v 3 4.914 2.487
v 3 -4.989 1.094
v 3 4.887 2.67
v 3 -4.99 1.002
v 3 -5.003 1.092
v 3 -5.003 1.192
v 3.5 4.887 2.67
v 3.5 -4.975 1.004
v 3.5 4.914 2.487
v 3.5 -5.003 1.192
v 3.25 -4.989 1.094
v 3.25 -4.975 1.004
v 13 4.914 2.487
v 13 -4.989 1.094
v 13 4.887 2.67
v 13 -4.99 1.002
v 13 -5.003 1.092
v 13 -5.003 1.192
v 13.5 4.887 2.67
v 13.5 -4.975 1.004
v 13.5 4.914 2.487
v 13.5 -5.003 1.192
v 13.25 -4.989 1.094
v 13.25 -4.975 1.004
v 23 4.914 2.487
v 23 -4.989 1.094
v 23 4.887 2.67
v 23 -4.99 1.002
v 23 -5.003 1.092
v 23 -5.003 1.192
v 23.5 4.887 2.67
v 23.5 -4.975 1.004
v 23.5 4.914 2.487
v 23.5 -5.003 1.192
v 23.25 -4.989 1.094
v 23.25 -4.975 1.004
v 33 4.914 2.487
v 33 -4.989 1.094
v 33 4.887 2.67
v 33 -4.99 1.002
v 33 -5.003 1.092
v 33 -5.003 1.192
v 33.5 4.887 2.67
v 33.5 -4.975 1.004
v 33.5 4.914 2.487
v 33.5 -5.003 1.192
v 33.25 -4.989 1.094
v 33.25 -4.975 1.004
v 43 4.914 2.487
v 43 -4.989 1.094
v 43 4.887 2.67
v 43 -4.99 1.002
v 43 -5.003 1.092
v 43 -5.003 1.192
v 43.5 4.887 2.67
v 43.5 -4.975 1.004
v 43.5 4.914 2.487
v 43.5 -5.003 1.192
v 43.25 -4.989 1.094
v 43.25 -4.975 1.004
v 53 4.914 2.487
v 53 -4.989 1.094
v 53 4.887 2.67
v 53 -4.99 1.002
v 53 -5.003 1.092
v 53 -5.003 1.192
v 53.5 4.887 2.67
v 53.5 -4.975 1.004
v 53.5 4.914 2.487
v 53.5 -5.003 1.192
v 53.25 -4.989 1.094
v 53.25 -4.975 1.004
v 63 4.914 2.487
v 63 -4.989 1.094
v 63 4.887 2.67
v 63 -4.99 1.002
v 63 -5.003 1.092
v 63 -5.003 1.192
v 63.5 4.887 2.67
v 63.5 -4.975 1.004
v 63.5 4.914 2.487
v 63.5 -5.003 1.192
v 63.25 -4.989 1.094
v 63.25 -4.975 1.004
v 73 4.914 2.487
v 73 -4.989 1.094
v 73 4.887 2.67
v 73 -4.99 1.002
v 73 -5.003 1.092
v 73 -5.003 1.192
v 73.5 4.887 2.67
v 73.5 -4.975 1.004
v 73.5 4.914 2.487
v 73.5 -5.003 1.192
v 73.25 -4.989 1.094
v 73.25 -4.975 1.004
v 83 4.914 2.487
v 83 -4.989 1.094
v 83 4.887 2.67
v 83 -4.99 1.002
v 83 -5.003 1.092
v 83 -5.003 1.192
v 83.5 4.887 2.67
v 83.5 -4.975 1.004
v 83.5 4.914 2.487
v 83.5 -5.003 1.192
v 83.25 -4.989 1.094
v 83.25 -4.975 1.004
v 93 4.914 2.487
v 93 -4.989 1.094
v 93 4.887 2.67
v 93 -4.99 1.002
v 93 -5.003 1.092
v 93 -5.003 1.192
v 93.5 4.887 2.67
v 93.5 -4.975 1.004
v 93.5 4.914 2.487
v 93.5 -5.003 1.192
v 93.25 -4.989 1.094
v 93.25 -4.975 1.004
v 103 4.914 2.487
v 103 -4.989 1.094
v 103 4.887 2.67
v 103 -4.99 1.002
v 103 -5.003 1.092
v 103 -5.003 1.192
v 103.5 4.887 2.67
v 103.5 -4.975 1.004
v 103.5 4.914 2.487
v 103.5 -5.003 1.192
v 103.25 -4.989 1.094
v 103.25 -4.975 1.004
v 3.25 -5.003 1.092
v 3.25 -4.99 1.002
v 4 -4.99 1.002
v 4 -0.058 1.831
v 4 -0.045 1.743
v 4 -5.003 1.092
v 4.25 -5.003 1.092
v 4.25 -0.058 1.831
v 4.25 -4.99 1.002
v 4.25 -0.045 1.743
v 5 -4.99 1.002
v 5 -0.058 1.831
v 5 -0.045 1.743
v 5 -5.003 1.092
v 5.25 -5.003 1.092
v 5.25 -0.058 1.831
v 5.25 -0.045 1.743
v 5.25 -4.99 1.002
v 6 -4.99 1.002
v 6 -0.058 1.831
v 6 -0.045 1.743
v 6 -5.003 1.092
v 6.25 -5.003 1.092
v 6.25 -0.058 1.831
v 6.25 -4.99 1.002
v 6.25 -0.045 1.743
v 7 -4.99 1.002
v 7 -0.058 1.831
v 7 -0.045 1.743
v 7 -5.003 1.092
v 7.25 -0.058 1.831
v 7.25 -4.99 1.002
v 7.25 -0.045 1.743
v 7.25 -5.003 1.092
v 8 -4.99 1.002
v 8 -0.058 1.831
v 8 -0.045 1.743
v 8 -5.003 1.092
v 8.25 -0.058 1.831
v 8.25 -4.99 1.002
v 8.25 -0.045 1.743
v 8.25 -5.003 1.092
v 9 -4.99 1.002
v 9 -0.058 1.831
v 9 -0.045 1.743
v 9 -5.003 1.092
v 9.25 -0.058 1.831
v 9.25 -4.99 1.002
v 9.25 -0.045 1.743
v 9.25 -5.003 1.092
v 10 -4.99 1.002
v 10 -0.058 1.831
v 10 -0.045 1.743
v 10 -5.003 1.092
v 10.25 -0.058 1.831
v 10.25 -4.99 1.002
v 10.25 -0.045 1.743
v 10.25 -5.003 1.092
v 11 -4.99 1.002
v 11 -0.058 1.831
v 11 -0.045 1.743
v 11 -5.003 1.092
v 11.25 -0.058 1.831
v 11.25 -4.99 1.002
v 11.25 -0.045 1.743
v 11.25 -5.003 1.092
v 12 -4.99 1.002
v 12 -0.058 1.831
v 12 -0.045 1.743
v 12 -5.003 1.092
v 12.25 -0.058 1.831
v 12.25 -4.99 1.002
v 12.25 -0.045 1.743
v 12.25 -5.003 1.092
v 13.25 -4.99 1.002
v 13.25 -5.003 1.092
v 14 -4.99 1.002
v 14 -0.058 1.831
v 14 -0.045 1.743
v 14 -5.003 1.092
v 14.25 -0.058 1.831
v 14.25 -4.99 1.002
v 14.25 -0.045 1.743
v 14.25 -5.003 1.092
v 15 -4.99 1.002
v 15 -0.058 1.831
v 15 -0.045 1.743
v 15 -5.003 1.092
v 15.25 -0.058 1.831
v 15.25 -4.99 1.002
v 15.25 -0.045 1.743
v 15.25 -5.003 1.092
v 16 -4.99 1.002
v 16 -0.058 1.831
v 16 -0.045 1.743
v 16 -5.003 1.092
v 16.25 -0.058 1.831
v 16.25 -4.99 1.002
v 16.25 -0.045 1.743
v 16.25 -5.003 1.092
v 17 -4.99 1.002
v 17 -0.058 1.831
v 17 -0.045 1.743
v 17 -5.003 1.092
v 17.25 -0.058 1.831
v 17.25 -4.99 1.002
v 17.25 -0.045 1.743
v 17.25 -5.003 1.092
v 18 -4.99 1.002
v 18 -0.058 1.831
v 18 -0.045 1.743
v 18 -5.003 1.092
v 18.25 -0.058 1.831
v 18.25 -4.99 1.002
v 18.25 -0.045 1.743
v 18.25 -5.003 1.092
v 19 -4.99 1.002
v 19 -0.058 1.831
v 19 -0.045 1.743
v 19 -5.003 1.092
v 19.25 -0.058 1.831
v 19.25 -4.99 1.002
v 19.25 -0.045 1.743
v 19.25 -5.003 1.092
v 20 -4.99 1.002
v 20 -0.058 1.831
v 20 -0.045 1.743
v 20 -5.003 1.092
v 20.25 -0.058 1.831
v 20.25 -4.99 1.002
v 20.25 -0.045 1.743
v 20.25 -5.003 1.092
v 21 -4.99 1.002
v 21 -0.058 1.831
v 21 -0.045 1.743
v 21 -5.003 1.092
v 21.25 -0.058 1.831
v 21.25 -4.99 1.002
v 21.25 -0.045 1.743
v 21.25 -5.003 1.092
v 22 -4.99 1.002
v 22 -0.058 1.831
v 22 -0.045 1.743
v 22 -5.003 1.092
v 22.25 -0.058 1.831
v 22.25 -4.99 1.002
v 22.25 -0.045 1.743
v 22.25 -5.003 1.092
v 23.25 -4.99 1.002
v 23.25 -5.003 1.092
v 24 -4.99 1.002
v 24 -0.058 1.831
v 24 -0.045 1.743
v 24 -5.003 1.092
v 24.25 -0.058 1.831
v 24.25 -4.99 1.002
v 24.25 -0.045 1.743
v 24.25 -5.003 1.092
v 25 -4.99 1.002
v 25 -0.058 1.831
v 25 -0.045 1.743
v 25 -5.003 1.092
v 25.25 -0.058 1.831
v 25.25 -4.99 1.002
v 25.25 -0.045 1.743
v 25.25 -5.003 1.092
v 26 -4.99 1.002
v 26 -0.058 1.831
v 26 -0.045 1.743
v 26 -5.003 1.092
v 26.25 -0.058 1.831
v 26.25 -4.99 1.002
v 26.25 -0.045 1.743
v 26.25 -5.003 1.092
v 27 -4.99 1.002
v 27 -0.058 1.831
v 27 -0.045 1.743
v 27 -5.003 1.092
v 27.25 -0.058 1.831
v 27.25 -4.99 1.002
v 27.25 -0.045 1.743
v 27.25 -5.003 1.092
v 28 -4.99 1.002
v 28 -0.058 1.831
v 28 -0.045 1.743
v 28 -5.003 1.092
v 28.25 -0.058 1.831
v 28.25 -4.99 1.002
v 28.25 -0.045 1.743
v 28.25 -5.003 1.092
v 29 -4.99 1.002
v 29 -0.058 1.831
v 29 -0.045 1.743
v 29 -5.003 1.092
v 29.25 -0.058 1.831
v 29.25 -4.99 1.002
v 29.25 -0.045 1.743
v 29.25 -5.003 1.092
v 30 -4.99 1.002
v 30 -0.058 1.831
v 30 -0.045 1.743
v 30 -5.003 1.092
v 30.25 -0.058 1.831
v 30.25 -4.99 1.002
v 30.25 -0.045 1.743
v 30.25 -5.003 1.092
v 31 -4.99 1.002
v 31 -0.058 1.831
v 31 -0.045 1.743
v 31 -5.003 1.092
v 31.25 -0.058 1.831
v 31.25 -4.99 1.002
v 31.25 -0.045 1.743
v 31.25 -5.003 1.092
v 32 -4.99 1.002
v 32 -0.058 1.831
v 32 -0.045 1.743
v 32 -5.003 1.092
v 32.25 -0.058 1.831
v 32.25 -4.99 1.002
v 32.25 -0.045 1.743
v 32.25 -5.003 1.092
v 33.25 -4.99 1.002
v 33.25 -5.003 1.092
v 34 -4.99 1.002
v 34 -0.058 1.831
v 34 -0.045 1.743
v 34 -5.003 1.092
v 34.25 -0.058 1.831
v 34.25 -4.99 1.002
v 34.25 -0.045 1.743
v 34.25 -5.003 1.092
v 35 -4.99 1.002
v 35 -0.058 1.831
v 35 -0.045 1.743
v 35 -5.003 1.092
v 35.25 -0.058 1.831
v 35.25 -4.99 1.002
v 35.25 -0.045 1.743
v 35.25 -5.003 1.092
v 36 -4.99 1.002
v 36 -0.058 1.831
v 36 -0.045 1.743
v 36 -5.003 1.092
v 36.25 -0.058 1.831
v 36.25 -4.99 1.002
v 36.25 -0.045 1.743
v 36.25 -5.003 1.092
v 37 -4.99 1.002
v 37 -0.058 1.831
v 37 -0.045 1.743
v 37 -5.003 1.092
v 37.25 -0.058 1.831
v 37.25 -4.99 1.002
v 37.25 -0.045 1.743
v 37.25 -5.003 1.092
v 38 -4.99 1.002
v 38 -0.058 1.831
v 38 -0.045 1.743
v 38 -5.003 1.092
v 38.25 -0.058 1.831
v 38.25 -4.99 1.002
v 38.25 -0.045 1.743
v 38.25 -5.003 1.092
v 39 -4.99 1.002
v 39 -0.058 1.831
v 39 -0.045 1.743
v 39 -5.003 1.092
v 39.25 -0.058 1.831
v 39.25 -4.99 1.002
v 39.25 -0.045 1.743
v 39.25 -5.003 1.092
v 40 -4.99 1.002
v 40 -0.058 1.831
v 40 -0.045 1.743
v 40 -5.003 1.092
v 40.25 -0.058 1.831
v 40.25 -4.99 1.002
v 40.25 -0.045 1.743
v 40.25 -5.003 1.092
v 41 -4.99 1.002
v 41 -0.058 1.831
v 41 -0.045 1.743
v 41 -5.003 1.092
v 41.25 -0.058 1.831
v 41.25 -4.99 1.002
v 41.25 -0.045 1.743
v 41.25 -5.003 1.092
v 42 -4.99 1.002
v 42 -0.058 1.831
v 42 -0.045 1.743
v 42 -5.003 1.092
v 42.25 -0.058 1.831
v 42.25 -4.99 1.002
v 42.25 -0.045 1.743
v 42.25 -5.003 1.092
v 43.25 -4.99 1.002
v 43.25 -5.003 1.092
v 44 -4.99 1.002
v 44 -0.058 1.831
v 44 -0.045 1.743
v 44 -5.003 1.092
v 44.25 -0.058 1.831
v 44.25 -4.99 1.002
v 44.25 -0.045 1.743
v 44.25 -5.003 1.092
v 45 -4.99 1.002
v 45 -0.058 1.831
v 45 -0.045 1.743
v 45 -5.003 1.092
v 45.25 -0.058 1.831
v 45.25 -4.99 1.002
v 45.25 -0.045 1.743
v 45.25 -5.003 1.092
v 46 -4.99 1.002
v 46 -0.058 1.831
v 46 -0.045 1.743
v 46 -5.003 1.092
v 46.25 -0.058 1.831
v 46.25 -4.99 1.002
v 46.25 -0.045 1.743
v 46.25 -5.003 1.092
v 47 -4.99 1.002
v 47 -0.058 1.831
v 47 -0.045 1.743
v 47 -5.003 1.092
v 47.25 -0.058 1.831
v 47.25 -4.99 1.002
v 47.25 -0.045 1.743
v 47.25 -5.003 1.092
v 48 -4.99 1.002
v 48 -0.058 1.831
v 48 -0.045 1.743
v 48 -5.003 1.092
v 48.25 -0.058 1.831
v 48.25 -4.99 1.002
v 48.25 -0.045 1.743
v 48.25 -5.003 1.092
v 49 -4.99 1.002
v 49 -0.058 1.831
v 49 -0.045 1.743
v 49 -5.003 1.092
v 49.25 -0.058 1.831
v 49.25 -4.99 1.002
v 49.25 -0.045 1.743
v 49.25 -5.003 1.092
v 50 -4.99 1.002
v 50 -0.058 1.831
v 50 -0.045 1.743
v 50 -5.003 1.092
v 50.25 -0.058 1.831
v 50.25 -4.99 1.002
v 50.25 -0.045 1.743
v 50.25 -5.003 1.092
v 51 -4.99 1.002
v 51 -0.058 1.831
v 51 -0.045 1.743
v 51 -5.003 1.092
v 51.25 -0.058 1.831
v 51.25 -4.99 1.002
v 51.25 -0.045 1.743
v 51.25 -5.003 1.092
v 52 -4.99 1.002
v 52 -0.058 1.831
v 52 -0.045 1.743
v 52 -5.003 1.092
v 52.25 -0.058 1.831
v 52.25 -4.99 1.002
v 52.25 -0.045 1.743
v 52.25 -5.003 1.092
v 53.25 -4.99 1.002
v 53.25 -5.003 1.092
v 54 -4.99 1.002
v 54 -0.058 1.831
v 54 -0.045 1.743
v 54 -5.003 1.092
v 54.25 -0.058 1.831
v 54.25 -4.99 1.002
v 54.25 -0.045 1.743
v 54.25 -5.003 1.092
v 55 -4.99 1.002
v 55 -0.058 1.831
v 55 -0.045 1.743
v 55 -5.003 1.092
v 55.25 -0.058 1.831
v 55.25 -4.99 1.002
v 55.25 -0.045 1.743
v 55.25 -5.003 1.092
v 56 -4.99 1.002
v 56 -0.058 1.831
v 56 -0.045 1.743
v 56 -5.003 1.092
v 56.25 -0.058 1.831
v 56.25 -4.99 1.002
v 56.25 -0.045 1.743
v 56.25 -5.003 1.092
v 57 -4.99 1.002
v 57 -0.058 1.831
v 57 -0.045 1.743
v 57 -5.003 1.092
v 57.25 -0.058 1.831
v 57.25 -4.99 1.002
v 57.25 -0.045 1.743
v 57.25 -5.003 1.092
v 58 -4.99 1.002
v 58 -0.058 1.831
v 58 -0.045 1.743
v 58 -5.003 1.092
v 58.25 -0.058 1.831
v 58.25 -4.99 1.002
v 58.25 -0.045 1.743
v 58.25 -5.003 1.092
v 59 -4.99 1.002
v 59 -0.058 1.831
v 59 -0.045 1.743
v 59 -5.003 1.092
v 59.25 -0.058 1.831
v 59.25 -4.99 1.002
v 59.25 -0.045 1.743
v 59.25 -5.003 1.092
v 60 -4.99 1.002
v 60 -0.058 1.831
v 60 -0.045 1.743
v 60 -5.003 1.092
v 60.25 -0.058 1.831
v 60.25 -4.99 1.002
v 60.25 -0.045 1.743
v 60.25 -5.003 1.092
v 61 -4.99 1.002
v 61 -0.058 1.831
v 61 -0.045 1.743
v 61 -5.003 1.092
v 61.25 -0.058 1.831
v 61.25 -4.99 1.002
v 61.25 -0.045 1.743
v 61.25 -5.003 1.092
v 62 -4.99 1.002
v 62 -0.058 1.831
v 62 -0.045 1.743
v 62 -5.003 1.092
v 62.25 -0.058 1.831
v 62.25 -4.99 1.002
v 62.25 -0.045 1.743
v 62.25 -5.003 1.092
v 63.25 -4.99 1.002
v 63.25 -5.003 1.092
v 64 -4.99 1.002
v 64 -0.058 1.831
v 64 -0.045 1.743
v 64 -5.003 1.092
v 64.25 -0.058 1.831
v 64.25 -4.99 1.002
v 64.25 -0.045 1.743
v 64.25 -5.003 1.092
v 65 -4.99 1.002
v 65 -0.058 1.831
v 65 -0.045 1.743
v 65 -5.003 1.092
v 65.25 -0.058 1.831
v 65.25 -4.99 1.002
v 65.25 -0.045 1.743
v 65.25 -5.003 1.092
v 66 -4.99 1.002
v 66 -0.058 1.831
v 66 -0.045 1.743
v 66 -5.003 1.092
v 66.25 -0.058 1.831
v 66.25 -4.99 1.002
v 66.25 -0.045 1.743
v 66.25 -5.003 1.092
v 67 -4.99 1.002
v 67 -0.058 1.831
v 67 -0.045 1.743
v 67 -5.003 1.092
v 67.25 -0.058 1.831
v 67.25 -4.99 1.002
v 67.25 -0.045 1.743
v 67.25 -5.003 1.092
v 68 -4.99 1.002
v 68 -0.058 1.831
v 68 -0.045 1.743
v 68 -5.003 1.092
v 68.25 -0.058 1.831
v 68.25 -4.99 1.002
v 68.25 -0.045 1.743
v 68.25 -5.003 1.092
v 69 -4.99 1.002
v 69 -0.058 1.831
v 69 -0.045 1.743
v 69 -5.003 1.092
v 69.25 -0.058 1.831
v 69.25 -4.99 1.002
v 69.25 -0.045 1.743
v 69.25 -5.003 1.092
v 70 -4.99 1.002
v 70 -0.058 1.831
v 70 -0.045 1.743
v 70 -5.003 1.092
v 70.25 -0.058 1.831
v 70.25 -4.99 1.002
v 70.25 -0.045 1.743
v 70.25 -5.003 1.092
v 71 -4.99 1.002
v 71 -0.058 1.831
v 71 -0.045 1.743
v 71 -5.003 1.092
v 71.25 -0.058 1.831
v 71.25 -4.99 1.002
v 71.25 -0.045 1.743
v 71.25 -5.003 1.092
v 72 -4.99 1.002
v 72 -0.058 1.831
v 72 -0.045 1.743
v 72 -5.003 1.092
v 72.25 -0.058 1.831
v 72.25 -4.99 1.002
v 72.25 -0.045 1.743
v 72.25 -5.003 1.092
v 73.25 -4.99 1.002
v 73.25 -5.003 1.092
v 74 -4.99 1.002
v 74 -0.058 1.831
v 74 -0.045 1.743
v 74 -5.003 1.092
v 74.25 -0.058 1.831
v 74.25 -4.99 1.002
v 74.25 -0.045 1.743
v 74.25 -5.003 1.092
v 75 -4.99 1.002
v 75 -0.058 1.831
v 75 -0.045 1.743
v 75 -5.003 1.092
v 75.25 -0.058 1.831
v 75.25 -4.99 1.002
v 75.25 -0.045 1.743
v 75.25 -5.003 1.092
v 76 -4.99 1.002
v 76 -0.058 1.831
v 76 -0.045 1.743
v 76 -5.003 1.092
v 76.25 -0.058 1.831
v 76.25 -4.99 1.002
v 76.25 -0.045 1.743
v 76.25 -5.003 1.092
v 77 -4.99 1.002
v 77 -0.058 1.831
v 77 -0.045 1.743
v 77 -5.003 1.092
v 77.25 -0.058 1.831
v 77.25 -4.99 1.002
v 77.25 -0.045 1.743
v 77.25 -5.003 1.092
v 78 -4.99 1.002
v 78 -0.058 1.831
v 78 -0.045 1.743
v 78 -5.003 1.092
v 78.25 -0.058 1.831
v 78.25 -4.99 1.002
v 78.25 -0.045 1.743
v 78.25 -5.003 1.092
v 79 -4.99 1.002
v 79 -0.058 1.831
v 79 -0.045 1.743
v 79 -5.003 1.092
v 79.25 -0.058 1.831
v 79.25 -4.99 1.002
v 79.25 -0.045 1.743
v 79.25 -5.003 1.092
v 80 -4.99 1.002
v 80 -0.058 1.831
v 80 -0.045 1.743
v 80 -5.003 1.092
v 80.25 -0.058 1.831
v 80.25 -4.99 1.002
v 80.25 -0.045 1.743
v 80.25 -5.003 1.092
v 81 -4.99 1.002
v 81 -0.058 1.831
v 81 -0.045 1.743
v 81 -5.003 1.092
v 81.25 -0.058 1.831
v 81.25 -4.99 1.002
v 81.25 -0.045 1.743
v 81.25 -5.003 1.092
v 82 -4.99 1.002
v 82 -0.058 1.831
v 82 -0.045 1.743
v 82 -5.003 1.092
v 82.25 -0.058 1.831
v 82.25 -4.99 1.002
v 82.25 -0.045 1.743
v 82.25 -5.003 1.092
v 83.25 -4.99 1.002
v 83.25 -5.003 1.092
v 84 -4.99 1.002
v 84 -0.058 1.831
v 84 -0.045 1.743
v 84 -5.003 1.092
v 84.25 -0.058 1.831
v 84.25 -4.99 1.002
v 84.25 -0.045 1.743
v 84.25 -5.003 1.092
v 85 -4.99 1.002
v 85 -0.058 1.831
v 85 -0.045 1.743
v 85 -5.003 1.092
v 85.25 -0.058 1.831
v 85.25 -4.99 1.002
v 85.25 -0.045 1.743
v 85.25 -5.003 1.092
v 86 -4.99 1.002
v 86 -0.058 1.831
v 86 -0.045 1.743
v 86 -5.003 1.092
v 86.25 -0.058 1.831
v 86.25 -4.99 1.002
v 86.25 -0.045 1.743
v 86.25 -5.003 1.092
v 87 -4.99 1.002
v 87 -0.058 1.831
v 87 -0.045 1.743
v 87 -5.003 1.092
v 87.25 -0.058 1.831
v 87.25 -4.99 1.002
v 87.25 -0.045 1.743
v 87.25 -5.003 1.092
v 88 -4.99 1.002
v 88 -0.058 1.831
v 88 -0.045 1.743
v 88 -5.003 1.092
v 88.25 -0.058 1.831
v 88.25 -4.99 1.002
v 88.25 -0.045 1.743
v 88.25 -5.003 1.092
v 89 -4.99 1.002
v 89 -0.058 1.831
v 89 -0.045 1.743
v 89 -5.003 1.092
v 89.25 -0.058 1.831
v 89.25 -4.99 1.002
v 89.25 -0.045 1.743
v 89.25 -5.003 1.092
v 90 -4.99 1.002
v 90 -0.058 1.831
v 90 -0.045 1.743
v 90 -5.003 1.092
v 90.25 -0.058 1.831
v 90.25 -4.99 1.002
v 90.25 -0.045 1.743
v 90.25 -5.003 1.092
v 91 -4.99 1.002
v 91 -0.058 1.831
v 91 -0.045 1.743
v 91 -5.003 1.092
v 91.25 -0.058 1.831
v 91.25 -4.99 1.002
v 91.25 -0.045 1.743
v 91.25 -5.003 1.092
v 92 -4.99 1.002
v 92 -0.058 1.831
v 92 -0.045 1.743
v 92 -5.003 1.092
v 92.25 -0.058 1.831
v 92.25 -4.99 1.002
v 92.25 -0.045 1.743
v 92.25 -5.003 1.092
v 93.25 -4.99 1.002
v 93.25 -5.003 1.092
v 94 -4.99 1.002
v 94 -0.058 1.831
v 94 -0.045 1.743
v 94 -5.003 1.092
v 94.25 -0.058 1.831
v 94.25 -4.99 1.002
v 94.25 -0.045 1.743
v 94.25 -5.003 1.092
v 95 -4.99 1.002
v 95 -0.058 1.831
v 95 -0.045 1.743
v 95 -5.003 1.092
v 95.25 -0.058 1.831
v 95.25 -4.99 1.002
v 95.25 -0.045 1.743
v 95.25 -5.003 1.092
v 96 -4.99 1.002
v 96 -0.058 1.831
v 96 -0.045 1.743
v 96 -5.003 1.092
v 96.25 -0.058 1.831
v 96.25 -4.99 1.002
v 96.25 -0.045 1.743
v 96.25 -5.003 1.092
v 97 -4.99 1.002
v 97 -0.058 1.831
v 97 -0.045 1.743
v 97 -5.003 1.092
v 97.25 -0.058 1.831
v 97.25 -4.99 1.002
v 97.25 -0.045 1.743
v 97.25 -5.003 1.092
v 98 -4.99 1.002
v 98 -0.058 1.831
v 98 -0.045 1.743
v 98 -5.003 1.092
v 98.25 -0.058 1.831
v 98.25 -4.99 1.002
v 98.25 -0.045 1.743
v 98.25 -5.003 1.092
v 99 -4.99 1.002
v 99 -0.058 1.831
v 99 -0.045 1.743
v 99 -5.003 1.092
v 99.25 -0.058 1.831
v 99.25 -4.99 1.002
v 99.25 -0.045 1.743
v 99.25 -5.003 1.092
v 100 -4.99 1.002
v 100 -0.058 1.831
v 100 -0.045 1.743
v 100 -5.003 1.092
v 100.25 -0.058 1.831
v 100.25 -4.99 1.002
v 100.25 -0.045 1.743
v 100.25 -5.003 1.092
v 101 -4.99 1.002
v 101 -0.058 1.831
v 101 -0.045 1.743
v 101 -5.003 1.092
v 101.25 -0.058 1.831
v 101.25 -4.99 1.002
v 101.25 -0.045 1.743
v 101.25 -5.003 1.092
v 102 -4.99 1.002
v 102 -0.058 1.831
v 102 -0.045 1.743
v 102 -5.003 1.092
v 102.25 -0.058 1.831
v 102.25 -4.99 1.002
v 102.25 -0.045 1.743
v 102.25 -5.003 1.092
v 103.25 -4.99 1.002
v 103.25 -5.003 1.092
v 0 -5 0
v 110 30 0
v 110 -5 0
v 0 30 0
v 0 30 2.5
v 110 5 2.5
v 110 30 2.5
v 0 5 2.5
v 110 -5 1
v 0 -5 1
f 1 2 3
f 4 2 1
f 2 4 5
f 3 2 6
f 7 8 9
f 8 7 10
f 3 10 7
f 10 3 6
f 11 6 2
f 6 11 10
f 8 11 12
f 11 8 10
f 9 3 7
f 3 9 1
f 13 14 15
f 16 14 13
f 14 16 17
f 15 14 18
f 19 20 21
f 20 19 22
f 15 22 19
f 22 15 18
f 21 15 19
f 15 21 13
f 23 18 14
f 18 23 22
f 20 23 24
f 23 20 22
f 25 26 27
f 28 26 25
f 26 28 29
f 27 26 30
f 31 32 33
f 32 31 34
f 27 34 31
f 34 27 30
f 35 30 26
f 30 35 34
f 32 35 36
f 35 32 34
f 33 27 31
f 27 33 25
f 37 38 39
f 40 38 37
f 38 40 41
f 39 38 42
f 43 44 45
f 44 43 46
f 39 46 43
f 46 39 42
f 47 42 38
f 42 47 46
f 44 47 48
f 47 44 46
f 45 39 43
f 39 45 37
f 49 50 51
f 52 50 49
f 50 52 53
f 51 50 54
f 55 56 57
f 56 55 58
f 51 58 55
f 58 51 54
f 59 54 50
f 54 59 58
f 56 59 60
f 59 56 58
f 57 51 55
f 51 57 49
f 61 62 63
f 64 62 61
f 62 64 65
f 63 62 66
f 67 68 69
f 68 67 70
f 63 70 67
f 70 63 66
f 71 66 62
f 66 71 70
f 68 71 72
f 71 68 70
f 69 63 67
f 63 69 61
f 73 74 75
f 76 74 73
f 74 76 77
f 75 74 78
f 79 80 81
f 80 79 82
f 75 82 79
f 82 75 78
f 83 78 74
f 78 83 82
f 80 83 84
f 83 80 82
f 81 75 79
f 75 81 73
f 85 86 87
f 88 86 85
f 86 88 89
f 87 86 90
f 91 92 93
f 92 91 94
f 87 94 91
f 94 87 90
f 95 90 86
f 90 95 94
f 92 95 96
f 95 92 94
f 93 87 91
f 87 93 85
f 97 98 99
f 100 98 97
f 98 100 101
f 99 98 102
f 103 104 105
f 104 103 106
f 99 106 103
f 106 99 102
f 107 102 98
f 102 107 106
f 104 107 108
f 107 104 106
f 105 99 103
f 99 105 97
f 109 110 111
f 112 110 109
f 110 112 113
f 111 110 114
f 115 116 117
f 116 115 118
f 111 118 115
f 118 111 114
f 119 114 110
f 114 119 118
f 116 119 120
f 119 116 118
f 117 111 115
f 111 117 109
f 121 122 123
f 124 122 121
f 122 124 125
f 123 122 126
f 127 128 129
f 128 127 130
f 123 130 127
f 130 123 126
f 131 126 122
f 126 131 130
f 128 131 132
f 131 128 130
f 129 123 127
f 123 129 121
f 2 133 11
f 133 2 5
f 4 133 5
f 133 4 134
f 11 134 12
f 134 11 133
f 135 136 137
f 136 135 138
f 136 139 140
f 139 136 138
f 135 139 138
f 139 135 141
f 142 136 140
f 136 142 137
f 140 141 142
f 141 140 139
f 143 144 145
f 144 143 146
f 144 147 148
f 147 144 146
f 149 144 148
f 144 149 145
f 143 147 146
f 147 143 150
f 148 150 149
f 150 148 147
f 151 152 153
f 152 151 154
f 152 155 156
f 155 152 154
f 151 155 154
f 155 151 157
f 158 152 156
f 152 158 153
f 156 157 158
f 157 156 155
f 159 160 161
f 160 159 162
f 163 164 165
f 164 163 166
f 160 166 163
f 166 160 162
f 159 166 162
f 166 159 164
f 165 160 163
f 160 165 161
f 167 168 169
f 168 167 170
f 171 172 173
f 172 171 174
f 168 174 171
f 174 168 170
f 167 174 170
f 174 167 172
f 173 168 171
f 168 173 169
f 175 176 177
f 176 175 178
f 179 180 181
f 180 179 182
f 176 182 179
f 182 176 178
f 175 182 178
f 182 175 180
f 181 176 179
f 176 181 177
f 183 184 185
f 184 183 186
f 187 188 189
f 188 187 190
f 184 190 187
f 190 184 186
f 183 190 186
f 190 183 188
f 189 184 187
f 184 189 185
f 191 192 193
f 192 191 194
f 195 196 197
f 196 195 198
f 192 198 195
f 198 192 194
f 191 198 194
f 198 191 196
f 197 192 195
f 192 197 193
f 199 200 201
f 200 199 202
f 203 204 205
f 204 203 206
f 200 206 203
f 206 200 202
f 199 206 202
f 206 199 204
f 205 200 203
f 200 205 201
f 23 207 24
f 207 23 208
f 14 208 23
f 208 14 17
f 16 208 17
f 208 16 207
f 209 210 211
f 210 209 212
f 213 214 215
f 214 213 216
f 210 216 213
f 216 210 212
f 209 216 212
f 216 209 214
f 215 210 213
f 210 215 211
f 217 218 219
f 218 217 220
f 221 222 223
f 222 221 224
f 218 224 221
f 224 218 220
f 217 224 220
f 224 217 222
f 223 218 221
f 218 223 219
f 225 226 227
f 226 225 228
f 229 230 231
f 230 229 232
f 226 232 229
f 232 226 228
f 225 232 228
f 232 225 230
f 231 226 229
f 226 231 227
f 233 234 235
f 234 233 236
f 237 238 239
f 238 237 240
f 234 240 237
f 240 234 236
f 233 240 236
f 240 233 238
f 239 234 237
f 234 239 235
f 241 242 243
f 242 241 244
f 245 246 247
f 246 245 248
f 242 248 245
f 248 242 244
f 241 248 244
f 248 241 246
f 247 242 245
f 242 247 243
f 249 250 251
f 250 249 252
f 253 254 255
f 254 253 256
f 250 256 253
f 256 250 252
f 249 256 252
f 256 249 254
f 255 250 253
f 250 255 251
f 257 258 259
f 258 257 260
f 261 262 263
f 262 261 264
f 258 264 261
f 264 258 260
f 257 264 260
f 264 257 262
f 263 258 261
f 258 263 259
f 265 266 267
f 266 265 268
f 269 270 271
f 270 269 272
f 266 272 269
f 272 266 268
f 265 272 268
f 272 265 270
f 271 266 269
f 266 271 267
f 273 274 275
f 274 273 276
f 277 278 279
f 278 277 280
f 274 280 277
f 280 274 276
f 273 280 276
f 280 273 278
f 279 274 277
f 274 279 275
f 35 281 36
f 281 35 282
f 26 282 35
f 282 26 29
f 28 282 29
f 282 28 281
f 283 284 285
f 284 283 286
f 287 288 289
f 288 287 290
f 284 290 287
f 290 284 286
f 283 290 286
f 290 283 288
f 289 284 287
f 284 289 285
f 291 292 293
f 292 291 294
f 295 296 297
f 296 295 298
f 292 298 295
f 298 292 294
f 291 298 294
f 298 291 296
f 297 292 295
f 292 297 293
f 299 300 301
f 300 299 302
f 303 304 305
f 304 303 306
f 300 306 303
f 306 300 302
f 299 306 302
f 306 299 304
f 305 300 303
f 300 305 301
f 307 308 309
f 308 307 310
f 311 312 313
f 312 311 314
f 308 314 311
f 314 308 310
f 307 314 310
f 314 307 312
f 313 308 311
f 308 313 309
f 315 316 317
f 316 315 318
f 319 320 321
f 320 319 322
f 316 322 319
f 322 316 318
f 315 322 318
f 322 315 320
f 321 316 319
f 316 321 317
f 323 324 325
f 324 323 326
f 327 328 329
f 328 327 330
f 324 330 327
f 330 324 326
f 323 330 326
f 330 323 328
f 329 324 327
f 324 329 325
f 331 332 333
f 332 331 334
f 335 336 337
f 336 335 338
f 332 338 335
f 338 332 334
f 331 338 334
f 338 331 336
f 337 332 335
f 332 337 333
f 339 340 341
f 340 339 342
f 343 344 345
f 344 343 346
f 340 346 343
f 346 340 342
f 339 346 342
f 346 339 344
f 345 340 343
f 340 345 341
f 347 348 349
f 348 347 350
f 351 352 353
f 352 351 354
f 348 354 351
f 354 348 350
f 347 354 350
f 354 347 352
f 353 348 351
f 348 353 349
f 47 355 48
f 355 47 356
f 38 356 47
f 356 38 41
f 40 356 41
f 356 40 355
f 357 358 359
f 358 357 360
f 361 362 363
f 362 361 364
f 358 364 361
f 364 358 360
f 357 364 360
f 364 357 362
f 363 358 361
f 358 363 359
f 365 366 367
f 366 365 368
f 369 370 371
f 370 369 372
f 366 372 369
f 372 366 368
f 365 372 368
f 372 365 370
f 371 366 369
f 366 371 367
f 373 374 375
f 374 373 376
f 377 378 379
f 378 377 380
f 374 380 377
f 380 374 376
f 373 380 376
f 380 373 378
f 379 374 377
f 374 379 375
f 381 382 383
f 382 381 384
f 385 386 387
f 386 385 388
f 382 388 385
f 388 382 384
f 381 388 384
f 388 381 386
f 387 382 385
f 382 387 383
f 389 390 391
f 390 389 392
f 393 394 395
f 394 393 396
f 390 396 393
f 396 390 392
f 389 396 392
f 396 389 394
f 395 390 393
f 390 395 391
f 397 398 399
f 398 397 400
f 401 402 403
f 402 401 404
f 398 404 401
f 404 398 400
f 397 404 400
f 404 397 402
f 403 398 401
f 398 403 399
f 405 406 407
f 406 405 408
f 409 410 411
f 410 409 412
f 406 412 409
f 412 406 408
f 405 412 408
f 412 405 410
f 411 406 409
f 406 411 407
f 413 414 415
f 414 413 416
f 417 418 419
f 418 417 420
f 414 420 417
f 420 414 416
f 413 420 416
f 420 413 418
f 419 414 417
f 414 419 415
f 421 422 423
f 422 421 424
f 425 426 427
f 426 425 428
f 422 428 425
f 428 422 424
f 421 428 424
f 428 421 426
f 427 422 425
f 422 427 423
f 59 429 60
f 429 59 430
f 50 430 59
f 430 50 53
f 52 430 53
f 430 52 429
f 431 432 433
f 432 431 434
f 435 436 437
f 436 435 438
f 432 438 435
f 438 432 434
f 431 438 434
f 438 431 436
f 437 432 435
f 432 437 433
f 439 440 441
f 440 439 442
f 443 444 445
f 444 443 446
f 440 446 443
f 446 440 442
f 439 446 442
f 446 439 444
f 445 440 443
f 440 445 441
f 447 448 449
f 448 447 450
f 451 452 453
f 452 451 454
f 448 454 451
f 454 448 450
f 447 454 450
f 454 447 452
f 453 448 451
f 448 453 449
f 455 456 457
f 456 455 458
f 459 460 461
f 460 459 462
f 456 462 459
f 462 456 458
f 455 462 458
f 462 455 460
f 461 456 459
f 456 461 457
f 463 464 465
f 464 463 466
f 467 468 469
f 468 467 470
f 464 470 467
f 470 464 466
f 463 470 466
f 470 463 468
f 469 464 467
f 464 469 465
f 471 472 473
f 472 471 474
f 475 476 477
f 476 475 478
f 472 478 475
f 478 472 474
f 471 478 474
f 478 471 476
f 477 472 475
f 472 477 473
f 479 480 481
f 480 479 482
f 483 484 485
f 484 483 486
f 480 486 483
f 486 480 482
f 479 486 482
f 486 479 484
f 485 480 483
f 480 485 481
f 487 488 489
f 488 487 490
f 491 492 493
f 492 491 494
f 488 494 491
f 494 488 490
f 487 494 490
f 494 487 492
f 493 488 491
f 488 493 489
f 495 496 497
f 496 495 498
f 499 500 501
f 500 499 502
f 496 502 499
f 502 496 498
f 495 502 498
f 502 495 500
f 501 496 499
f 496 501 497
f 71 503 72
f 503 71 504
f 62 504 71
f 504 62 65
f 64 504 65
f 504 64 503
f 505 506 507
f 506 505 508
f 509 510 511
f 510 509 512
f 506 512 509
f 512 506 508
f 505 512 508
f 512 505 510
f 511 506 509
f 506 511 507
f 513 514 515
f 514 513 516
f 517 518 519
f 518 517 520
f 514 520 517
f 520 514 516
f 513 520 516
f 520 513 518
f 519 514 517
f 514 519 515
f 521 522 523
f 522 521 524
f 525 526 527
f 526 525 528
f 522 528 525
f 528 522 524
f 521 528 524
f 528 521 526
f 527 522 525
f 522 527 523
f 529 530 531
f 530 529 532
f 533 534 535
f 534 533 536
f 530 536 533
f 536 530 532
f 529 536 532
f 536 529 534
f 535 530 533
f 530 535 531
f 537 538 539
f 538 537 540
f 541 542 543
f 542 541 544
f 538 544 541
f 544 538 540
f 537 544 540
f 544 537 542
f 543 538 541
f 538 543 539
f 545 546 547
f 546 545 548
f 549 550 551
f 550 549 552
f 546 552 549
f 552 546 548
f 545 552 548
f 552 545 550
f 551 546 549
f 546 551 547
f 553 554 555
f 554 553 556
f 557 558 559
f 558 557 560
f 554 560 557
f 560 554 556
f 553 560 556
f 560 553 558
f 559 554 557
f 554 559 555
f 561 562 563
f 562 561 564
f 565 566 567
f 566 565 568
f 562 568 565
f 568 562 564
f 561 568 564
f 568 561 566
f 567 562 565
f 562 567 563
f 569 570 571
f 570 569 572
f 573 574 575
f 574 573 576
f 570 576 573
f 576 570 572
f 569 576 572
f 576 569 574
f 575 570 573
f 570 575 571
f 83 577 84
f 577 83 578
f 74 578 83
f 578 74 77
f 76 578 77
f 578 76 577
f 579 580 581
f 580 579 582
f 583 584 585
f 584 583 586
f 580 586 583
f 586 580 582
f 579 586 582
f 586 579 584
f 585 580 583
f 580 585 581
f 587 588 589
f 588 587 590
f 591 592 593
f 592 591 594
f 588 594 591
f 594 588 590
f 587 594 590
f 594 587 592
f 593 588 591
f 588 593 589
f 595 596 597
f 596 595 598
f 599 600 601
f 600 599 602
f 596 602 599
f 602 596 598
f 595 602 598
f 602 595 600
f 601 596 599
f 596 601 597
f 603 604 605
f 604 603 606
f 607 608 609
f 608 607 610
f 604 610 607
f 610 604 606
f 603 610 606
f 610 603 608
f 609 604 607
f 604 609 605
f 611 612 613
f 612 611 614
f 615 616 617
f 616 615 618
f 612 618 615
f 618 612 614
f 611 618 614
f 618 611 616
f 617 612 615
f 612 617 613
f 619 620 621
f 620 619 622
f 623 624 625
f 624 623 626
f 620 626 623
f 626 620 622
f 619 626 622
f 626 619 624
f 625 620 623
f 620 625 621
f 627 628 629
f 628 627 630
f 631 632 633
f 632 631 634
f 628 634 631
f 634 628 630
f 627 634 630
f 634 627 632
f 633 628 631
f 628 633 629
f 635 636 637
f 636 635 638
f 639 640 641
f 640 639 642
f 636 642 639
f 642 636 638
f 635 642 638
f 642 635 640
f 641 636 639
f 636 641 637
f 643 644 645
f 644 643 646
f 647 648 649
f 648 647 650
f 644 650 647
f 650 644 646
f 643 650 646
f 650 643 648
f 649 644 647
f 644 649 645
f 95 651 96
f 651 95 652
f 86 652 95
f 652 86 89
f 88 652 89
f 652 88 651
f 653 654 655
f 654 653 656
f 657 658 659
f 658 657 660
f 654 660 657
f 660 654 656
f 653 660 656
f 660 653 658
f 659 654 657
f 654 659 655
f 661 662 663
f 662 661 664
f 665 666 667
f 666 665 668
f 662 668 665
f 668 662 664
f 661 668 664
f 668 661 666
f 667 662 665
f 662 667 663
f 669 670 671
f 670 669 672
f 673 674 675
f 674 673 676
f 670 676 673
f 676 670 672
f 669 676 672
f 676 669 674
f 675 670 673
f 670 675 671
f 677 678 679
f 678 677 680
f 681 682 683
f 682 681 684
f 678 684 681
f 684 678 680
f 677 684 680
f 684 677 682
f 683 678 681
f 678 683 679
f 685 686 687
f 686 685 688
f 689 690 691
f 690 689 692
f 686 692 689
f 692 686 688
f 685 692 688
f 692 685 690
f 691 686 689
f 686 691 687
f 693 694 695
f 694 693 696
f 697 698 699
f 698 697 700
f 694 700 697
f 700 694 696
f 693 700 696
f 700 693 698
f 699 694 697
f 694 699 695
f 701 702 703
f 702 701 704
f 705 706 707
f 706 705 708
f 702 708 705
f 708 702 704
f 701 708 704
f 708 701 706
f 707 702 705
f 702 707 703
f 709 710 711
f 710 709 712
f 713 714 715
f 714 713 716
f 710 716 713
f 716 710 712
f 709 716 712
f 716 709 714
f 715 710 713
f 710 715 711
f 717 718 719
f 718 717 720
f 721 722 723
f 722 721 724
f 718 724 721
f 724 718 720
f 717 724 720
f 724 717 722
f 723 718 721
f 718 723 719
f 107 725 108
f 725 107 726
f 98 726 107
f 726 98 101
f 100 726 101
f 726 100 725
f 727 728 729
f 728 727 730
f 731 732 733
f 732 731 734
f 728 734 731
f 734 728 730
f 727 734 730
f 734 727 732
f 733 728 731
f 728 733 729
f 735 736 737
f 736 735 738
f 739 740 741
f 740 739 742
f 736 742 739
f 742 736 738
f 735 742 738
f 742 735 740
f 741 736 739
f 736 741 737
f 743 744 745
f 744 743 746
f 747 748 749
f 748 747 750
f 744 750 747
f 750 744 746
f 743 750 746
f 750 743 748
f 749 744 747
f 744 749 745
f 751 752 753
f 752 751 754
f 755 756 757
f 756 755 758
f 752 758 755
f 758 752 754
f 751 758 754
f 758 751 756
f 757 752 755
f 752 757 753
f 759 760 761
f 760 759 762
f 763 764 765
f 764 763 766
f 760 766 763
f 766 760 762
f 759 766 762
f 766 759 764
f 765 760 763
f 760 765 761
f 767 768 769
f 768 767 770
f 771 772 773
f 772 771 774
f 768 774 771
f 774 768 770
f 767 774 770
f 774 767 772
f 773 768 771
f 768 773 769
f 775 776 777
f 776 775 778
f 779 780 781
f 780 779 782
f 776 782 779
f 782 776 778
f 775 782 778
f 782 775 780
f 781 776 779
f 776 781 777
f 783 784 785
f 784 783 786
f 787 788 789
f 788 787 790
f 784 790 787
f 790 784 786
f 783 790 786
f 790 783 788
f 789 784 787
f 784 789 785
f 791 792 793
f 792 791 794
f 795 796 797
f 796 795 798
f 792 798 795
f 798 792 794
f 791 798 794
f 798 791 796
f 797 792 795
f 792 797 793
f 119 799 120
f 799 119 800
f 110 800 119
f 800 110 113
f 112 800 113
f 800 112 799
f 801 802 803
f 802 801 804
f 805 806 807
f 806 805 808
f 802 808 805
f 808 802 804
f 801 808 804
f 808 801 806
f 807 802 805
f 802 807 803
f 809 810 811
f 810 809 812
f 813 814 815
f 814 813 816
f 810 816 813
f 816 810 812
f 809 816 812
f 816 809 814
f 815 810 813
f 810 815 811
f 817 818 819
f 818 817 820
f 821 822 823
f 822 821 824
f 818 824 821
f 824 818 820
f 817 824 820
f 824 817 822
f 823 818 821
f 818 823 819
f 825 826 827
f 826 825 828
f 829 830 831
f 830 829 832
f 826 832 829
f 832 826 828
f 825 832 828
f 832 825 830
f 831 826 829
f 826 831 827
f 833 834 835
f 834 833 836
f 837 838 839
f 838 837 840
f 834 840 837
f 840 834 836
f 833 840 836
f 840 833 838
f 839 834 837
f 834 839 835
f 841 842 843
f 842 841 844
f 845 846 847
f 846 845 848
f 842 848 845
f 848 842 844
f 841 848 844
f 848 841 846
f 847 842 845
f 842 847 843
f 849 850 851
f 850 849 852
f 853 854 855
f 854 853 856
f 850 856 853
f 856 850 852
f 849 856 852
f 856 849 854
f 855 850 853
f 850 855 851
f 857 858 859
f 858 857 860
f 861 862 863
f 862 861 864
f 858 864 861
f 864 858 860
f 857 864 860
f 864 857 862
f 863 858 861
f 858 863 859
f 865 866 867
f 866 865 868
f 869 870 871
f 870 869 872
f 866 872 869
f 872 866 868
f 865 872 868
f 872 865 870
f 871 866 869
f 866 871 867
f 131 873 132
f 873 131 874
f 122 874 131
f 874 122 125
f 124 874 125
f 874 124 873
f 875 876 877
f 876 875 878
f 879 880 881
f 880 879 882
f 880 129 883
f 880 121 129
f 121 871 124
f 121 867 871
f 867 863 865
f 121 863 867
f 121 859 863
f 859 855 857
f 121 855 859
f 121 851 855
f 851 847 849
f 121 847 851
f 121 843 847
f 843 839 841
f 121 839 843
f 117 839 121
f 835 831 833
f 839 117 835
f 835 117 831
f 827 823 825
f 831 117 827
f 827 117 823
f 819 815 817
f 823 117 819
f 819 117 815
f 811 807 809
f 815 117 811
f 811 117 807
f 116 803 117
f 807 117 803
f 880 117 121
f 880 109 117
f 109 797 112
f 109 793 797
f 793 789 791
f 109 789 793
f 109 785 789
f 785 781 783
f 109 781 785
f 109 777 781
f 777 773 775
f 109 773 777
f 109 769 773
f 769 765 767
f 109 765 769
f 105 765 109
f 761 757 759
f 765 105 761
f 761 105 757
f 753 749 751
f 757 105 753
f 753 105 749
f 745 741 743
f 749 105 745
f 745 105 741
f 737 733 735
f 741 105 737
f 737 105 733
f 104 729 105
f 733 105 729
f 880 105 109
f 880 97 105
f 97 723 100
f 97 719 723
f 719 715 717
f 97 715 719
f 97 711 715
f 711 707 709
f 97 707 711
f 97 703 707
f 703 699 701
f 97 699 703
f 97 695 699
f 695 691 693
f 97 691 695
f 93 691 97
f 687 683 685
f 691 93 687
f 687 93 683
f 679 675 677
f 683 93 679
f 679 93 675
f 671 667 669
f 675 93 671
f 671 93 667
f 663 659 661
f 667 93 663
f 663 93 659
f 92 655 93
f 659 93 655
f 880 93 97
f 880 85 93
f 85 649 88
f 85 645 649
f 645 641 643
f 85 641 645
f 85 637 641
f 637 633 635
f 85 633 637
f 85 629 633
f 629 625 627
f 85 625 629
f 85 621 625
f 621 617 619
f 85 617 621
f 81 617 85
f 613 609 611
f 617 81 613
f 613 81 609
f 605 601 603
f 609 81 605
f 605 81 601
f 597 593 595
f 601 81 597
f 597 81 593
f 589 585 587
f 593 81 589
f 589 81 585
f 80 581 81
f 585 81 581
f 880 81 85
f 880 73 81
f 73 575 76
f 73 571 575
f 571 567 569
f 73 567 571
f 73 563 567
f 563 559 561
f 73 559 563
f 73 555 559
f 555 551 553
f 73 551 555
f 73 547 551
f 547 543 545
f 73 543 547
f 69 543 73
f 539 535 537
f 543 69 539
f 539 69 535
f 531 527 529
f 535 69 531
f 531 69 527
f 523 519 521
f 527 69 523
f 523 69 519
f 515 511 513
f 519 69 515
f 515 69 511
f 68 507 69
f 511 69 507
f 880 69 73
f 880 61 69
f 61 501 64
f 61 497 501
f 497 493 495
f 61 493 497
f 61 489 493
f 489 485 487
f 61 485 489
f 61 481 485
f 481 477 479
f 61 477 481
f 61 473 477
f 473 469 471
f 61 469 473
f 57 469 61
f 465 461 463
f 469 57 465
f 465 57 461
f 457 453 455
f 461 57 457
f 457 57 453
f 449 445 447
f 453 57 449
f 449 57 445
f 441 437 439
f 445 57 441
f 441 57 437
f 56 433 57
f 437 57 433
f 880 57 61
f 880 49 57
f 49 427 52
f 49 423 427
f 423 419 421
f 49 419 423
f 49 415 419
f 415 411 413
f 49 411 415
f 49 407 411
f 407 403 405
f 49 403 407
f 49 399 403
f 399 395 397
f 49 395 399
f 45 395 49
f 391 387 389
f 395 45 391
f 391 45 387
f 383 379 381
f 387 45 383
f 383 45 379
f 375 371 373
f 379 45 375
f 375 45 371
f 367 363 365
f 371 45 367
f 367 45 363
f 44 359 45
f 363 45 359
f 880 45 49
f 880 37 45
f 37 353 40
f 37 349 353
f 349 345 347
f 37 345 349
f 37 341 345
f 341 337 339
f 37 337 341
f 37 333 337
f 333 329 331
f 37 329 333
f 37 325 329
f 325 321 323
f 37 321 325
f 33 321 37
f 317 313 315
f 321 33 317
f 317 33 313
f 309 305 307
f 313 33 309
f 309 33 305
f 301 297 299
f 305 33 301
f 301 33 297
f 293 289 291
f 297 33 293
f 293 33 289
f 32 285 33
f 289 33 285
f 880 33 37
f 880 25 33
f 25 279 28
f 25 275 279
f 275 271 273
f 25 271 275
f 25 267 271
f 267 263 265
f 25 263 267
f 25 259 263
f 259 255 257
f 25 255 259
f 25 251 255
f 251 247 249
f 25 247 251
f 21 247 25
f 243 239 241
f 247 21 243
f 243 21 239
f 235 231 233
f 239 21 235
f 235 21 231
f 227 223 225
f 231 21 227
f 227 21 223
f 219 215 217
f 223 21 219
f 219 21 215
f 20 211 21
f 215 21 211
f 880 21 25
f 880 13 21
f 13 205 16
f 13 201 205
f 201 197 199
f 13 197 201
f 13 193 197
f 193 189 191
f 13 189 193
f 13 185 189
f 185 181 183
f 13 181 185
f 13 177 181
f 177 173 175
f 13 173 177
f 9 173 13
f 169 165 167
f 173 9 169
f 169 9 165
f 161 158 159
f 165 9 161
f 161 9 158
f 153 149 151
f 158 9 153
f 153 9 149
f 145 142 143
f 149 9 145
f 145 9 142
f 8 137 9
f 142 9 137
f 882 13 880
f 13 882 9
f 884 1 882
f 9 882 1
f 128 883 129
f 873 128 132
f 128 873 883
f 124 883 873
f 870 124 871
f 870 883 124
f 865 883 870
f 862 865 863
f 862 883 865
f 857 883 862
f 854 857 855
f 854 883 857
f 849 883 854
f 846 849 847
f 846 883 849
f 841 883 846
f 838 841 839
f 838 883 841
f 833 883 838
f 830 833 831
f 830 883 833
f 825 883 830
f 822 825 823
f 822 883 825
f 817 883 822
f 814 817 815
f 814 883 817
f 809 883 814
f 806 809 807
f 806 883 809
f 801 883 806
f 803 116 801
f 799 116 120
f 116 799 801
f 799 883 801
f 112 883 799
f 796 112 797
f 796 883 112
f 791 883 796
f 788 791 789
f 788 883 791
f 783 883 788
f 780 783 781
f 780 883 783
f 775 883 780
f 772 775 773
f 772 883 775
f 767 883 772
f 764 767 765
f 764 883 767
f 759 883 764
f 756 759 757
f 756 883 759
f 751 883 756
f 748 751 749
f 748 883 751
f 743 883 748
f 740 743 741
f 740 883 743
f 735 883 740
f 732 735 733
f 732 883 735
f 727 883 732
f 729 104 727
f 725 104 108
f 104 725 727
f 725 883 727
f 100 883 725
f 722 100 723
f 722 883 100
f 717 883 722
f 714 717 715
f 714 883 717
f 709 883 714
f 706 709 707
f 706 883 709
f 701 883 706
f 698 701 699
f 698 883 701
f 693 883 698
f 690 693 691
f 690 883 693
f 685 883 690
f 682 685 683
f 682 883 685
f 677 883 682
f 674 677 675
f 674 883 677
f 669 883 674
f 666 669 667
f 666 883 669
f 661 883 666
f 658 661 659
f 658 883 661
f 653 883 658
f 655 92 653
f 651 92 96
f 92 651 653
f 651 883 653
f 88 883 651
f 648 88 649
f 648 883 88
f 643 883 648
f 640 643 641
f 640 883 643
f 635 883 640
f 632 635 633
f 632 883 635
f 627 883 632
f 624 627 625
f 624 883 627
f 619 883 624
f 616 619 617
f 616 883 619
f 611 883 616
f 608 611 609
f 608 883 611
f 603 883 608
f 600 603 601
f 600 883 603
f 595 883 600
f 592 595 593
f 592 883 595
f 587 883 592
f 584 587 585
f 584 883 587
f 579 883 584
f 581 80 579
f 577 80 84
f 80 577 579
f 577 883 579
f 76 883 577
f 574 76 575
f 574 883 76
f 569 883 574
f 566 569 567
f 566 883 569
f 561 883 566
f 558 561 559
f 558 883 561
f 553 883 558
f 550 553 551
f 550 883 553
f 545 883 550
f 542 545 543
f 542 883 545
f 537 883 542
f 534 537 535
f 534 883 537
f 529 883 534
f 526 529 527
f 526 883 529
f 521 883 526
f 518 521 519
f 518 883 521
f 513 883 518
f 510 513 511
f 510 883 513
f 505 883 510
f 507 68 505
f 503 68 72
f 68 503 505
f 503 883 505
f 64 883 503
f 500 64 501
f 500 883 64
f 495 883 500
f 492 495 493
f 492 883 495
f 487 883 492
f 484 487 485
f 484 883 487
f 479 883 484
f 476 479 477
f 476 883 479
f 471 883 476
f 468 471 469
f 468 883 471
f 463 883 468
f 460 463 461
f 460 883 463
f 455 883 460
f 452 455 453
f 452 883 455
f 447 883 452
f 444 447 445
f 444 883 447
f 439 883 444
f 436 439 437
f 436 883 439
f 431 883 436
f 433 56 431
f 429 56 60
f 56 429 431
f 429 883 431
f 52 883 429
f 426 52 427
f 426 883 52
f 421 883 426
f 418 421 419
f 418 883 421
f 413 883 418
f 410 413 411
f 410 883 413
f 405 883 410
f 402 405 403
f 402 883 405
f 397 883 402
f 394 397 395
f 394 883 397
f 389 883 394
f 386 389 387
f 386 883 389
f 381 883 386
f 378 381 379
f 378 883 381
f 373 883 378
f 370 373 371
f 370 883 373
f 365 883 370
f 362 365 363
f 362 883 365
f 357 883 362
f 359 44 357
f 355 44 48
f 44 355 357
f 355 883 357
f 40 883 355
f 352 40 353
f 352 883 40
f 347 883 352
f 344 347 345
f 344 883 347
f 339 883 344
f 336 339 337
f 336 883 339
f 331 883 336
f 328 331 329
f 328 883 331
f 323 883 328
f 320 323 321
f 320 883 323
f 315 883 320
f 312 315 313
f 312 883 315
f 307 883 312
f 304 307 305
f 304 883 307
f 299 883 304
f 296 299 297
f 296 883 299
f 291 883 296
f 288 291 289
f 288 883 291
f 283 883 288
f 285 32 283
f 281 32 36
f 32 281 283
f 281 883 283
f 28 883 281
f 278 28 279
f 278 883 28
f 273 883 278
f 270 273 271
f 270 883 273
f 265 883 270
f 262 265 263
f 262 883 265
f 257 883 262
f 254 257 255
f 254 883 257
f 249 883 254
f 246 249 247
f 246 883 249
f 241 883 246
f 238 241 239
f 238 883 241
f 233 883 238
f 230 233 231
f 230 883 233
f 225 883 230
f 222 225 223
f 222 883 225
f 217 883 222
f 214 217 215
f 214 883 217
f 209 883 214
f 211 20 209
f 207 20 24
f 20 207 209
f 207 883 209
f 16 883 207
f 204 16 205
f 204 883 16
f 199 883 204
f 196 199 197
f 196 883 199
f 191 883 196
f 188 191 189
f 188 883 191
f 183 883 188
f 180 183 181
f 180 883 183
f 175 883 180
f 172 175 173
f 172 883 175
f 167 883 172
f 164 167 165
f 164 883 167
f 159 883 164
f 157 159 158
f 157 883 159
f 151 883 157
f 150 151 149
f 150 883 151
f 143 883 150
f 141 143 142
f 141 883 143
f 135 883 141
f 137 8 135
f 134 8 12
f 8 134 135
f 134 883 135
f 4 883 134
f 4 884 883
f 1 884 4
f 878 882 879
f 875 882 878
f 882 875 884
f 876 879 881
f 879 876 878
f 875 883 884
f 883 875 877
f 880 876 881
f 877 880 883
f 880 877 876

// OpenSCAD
//customizable ruler by Stu121

use<write/Write.scad>



RulerLength=10;// [1:50]
RulerText="Roy sin linjal!";
FontSize=8;
TextX=3;
TextY=18;
TextHeight=1;
NumberSize=7;//[1:15]
NumberOffset=0;//[0:3]

difference() {
    hull() {
        translate([0,5,0]) cube([(RulerLength*10)+10,25,2.5]);
        translate([0,-5,0])  cube([(RulerLength*10)+10,1,1]);
    }
}

for (i=[1:1:RulerLength]) {
    if (i > 9) {
        translate([(i*10)-2+NumberOffset,5.5,1]) write(str(i),h=NumberSize,t=2); 
    } else
        translate([(i*10)+NumberOffset,5.5,1]) write(str(i),h=NumberSize,t=2); 
}
translate([1,5.5,1]) write("CM",h=5,t=2); 


for (i=[0:10:RulerLength*10]){  
translate([i+3,-4.9,0.5]) rotate([8.5,0,0]) cube([.5,10,.7]);
}

for (i=[0:1:RulerLength*10]){   //embosed ruler lines
translate([i+3,-4.9,0.4]) rotate([8.5,0,0]) cube([.25,5,.7]);
}

translate([TextX,TextY,TextHeight])  write(RulerText,h=FontSize,t=2); 
